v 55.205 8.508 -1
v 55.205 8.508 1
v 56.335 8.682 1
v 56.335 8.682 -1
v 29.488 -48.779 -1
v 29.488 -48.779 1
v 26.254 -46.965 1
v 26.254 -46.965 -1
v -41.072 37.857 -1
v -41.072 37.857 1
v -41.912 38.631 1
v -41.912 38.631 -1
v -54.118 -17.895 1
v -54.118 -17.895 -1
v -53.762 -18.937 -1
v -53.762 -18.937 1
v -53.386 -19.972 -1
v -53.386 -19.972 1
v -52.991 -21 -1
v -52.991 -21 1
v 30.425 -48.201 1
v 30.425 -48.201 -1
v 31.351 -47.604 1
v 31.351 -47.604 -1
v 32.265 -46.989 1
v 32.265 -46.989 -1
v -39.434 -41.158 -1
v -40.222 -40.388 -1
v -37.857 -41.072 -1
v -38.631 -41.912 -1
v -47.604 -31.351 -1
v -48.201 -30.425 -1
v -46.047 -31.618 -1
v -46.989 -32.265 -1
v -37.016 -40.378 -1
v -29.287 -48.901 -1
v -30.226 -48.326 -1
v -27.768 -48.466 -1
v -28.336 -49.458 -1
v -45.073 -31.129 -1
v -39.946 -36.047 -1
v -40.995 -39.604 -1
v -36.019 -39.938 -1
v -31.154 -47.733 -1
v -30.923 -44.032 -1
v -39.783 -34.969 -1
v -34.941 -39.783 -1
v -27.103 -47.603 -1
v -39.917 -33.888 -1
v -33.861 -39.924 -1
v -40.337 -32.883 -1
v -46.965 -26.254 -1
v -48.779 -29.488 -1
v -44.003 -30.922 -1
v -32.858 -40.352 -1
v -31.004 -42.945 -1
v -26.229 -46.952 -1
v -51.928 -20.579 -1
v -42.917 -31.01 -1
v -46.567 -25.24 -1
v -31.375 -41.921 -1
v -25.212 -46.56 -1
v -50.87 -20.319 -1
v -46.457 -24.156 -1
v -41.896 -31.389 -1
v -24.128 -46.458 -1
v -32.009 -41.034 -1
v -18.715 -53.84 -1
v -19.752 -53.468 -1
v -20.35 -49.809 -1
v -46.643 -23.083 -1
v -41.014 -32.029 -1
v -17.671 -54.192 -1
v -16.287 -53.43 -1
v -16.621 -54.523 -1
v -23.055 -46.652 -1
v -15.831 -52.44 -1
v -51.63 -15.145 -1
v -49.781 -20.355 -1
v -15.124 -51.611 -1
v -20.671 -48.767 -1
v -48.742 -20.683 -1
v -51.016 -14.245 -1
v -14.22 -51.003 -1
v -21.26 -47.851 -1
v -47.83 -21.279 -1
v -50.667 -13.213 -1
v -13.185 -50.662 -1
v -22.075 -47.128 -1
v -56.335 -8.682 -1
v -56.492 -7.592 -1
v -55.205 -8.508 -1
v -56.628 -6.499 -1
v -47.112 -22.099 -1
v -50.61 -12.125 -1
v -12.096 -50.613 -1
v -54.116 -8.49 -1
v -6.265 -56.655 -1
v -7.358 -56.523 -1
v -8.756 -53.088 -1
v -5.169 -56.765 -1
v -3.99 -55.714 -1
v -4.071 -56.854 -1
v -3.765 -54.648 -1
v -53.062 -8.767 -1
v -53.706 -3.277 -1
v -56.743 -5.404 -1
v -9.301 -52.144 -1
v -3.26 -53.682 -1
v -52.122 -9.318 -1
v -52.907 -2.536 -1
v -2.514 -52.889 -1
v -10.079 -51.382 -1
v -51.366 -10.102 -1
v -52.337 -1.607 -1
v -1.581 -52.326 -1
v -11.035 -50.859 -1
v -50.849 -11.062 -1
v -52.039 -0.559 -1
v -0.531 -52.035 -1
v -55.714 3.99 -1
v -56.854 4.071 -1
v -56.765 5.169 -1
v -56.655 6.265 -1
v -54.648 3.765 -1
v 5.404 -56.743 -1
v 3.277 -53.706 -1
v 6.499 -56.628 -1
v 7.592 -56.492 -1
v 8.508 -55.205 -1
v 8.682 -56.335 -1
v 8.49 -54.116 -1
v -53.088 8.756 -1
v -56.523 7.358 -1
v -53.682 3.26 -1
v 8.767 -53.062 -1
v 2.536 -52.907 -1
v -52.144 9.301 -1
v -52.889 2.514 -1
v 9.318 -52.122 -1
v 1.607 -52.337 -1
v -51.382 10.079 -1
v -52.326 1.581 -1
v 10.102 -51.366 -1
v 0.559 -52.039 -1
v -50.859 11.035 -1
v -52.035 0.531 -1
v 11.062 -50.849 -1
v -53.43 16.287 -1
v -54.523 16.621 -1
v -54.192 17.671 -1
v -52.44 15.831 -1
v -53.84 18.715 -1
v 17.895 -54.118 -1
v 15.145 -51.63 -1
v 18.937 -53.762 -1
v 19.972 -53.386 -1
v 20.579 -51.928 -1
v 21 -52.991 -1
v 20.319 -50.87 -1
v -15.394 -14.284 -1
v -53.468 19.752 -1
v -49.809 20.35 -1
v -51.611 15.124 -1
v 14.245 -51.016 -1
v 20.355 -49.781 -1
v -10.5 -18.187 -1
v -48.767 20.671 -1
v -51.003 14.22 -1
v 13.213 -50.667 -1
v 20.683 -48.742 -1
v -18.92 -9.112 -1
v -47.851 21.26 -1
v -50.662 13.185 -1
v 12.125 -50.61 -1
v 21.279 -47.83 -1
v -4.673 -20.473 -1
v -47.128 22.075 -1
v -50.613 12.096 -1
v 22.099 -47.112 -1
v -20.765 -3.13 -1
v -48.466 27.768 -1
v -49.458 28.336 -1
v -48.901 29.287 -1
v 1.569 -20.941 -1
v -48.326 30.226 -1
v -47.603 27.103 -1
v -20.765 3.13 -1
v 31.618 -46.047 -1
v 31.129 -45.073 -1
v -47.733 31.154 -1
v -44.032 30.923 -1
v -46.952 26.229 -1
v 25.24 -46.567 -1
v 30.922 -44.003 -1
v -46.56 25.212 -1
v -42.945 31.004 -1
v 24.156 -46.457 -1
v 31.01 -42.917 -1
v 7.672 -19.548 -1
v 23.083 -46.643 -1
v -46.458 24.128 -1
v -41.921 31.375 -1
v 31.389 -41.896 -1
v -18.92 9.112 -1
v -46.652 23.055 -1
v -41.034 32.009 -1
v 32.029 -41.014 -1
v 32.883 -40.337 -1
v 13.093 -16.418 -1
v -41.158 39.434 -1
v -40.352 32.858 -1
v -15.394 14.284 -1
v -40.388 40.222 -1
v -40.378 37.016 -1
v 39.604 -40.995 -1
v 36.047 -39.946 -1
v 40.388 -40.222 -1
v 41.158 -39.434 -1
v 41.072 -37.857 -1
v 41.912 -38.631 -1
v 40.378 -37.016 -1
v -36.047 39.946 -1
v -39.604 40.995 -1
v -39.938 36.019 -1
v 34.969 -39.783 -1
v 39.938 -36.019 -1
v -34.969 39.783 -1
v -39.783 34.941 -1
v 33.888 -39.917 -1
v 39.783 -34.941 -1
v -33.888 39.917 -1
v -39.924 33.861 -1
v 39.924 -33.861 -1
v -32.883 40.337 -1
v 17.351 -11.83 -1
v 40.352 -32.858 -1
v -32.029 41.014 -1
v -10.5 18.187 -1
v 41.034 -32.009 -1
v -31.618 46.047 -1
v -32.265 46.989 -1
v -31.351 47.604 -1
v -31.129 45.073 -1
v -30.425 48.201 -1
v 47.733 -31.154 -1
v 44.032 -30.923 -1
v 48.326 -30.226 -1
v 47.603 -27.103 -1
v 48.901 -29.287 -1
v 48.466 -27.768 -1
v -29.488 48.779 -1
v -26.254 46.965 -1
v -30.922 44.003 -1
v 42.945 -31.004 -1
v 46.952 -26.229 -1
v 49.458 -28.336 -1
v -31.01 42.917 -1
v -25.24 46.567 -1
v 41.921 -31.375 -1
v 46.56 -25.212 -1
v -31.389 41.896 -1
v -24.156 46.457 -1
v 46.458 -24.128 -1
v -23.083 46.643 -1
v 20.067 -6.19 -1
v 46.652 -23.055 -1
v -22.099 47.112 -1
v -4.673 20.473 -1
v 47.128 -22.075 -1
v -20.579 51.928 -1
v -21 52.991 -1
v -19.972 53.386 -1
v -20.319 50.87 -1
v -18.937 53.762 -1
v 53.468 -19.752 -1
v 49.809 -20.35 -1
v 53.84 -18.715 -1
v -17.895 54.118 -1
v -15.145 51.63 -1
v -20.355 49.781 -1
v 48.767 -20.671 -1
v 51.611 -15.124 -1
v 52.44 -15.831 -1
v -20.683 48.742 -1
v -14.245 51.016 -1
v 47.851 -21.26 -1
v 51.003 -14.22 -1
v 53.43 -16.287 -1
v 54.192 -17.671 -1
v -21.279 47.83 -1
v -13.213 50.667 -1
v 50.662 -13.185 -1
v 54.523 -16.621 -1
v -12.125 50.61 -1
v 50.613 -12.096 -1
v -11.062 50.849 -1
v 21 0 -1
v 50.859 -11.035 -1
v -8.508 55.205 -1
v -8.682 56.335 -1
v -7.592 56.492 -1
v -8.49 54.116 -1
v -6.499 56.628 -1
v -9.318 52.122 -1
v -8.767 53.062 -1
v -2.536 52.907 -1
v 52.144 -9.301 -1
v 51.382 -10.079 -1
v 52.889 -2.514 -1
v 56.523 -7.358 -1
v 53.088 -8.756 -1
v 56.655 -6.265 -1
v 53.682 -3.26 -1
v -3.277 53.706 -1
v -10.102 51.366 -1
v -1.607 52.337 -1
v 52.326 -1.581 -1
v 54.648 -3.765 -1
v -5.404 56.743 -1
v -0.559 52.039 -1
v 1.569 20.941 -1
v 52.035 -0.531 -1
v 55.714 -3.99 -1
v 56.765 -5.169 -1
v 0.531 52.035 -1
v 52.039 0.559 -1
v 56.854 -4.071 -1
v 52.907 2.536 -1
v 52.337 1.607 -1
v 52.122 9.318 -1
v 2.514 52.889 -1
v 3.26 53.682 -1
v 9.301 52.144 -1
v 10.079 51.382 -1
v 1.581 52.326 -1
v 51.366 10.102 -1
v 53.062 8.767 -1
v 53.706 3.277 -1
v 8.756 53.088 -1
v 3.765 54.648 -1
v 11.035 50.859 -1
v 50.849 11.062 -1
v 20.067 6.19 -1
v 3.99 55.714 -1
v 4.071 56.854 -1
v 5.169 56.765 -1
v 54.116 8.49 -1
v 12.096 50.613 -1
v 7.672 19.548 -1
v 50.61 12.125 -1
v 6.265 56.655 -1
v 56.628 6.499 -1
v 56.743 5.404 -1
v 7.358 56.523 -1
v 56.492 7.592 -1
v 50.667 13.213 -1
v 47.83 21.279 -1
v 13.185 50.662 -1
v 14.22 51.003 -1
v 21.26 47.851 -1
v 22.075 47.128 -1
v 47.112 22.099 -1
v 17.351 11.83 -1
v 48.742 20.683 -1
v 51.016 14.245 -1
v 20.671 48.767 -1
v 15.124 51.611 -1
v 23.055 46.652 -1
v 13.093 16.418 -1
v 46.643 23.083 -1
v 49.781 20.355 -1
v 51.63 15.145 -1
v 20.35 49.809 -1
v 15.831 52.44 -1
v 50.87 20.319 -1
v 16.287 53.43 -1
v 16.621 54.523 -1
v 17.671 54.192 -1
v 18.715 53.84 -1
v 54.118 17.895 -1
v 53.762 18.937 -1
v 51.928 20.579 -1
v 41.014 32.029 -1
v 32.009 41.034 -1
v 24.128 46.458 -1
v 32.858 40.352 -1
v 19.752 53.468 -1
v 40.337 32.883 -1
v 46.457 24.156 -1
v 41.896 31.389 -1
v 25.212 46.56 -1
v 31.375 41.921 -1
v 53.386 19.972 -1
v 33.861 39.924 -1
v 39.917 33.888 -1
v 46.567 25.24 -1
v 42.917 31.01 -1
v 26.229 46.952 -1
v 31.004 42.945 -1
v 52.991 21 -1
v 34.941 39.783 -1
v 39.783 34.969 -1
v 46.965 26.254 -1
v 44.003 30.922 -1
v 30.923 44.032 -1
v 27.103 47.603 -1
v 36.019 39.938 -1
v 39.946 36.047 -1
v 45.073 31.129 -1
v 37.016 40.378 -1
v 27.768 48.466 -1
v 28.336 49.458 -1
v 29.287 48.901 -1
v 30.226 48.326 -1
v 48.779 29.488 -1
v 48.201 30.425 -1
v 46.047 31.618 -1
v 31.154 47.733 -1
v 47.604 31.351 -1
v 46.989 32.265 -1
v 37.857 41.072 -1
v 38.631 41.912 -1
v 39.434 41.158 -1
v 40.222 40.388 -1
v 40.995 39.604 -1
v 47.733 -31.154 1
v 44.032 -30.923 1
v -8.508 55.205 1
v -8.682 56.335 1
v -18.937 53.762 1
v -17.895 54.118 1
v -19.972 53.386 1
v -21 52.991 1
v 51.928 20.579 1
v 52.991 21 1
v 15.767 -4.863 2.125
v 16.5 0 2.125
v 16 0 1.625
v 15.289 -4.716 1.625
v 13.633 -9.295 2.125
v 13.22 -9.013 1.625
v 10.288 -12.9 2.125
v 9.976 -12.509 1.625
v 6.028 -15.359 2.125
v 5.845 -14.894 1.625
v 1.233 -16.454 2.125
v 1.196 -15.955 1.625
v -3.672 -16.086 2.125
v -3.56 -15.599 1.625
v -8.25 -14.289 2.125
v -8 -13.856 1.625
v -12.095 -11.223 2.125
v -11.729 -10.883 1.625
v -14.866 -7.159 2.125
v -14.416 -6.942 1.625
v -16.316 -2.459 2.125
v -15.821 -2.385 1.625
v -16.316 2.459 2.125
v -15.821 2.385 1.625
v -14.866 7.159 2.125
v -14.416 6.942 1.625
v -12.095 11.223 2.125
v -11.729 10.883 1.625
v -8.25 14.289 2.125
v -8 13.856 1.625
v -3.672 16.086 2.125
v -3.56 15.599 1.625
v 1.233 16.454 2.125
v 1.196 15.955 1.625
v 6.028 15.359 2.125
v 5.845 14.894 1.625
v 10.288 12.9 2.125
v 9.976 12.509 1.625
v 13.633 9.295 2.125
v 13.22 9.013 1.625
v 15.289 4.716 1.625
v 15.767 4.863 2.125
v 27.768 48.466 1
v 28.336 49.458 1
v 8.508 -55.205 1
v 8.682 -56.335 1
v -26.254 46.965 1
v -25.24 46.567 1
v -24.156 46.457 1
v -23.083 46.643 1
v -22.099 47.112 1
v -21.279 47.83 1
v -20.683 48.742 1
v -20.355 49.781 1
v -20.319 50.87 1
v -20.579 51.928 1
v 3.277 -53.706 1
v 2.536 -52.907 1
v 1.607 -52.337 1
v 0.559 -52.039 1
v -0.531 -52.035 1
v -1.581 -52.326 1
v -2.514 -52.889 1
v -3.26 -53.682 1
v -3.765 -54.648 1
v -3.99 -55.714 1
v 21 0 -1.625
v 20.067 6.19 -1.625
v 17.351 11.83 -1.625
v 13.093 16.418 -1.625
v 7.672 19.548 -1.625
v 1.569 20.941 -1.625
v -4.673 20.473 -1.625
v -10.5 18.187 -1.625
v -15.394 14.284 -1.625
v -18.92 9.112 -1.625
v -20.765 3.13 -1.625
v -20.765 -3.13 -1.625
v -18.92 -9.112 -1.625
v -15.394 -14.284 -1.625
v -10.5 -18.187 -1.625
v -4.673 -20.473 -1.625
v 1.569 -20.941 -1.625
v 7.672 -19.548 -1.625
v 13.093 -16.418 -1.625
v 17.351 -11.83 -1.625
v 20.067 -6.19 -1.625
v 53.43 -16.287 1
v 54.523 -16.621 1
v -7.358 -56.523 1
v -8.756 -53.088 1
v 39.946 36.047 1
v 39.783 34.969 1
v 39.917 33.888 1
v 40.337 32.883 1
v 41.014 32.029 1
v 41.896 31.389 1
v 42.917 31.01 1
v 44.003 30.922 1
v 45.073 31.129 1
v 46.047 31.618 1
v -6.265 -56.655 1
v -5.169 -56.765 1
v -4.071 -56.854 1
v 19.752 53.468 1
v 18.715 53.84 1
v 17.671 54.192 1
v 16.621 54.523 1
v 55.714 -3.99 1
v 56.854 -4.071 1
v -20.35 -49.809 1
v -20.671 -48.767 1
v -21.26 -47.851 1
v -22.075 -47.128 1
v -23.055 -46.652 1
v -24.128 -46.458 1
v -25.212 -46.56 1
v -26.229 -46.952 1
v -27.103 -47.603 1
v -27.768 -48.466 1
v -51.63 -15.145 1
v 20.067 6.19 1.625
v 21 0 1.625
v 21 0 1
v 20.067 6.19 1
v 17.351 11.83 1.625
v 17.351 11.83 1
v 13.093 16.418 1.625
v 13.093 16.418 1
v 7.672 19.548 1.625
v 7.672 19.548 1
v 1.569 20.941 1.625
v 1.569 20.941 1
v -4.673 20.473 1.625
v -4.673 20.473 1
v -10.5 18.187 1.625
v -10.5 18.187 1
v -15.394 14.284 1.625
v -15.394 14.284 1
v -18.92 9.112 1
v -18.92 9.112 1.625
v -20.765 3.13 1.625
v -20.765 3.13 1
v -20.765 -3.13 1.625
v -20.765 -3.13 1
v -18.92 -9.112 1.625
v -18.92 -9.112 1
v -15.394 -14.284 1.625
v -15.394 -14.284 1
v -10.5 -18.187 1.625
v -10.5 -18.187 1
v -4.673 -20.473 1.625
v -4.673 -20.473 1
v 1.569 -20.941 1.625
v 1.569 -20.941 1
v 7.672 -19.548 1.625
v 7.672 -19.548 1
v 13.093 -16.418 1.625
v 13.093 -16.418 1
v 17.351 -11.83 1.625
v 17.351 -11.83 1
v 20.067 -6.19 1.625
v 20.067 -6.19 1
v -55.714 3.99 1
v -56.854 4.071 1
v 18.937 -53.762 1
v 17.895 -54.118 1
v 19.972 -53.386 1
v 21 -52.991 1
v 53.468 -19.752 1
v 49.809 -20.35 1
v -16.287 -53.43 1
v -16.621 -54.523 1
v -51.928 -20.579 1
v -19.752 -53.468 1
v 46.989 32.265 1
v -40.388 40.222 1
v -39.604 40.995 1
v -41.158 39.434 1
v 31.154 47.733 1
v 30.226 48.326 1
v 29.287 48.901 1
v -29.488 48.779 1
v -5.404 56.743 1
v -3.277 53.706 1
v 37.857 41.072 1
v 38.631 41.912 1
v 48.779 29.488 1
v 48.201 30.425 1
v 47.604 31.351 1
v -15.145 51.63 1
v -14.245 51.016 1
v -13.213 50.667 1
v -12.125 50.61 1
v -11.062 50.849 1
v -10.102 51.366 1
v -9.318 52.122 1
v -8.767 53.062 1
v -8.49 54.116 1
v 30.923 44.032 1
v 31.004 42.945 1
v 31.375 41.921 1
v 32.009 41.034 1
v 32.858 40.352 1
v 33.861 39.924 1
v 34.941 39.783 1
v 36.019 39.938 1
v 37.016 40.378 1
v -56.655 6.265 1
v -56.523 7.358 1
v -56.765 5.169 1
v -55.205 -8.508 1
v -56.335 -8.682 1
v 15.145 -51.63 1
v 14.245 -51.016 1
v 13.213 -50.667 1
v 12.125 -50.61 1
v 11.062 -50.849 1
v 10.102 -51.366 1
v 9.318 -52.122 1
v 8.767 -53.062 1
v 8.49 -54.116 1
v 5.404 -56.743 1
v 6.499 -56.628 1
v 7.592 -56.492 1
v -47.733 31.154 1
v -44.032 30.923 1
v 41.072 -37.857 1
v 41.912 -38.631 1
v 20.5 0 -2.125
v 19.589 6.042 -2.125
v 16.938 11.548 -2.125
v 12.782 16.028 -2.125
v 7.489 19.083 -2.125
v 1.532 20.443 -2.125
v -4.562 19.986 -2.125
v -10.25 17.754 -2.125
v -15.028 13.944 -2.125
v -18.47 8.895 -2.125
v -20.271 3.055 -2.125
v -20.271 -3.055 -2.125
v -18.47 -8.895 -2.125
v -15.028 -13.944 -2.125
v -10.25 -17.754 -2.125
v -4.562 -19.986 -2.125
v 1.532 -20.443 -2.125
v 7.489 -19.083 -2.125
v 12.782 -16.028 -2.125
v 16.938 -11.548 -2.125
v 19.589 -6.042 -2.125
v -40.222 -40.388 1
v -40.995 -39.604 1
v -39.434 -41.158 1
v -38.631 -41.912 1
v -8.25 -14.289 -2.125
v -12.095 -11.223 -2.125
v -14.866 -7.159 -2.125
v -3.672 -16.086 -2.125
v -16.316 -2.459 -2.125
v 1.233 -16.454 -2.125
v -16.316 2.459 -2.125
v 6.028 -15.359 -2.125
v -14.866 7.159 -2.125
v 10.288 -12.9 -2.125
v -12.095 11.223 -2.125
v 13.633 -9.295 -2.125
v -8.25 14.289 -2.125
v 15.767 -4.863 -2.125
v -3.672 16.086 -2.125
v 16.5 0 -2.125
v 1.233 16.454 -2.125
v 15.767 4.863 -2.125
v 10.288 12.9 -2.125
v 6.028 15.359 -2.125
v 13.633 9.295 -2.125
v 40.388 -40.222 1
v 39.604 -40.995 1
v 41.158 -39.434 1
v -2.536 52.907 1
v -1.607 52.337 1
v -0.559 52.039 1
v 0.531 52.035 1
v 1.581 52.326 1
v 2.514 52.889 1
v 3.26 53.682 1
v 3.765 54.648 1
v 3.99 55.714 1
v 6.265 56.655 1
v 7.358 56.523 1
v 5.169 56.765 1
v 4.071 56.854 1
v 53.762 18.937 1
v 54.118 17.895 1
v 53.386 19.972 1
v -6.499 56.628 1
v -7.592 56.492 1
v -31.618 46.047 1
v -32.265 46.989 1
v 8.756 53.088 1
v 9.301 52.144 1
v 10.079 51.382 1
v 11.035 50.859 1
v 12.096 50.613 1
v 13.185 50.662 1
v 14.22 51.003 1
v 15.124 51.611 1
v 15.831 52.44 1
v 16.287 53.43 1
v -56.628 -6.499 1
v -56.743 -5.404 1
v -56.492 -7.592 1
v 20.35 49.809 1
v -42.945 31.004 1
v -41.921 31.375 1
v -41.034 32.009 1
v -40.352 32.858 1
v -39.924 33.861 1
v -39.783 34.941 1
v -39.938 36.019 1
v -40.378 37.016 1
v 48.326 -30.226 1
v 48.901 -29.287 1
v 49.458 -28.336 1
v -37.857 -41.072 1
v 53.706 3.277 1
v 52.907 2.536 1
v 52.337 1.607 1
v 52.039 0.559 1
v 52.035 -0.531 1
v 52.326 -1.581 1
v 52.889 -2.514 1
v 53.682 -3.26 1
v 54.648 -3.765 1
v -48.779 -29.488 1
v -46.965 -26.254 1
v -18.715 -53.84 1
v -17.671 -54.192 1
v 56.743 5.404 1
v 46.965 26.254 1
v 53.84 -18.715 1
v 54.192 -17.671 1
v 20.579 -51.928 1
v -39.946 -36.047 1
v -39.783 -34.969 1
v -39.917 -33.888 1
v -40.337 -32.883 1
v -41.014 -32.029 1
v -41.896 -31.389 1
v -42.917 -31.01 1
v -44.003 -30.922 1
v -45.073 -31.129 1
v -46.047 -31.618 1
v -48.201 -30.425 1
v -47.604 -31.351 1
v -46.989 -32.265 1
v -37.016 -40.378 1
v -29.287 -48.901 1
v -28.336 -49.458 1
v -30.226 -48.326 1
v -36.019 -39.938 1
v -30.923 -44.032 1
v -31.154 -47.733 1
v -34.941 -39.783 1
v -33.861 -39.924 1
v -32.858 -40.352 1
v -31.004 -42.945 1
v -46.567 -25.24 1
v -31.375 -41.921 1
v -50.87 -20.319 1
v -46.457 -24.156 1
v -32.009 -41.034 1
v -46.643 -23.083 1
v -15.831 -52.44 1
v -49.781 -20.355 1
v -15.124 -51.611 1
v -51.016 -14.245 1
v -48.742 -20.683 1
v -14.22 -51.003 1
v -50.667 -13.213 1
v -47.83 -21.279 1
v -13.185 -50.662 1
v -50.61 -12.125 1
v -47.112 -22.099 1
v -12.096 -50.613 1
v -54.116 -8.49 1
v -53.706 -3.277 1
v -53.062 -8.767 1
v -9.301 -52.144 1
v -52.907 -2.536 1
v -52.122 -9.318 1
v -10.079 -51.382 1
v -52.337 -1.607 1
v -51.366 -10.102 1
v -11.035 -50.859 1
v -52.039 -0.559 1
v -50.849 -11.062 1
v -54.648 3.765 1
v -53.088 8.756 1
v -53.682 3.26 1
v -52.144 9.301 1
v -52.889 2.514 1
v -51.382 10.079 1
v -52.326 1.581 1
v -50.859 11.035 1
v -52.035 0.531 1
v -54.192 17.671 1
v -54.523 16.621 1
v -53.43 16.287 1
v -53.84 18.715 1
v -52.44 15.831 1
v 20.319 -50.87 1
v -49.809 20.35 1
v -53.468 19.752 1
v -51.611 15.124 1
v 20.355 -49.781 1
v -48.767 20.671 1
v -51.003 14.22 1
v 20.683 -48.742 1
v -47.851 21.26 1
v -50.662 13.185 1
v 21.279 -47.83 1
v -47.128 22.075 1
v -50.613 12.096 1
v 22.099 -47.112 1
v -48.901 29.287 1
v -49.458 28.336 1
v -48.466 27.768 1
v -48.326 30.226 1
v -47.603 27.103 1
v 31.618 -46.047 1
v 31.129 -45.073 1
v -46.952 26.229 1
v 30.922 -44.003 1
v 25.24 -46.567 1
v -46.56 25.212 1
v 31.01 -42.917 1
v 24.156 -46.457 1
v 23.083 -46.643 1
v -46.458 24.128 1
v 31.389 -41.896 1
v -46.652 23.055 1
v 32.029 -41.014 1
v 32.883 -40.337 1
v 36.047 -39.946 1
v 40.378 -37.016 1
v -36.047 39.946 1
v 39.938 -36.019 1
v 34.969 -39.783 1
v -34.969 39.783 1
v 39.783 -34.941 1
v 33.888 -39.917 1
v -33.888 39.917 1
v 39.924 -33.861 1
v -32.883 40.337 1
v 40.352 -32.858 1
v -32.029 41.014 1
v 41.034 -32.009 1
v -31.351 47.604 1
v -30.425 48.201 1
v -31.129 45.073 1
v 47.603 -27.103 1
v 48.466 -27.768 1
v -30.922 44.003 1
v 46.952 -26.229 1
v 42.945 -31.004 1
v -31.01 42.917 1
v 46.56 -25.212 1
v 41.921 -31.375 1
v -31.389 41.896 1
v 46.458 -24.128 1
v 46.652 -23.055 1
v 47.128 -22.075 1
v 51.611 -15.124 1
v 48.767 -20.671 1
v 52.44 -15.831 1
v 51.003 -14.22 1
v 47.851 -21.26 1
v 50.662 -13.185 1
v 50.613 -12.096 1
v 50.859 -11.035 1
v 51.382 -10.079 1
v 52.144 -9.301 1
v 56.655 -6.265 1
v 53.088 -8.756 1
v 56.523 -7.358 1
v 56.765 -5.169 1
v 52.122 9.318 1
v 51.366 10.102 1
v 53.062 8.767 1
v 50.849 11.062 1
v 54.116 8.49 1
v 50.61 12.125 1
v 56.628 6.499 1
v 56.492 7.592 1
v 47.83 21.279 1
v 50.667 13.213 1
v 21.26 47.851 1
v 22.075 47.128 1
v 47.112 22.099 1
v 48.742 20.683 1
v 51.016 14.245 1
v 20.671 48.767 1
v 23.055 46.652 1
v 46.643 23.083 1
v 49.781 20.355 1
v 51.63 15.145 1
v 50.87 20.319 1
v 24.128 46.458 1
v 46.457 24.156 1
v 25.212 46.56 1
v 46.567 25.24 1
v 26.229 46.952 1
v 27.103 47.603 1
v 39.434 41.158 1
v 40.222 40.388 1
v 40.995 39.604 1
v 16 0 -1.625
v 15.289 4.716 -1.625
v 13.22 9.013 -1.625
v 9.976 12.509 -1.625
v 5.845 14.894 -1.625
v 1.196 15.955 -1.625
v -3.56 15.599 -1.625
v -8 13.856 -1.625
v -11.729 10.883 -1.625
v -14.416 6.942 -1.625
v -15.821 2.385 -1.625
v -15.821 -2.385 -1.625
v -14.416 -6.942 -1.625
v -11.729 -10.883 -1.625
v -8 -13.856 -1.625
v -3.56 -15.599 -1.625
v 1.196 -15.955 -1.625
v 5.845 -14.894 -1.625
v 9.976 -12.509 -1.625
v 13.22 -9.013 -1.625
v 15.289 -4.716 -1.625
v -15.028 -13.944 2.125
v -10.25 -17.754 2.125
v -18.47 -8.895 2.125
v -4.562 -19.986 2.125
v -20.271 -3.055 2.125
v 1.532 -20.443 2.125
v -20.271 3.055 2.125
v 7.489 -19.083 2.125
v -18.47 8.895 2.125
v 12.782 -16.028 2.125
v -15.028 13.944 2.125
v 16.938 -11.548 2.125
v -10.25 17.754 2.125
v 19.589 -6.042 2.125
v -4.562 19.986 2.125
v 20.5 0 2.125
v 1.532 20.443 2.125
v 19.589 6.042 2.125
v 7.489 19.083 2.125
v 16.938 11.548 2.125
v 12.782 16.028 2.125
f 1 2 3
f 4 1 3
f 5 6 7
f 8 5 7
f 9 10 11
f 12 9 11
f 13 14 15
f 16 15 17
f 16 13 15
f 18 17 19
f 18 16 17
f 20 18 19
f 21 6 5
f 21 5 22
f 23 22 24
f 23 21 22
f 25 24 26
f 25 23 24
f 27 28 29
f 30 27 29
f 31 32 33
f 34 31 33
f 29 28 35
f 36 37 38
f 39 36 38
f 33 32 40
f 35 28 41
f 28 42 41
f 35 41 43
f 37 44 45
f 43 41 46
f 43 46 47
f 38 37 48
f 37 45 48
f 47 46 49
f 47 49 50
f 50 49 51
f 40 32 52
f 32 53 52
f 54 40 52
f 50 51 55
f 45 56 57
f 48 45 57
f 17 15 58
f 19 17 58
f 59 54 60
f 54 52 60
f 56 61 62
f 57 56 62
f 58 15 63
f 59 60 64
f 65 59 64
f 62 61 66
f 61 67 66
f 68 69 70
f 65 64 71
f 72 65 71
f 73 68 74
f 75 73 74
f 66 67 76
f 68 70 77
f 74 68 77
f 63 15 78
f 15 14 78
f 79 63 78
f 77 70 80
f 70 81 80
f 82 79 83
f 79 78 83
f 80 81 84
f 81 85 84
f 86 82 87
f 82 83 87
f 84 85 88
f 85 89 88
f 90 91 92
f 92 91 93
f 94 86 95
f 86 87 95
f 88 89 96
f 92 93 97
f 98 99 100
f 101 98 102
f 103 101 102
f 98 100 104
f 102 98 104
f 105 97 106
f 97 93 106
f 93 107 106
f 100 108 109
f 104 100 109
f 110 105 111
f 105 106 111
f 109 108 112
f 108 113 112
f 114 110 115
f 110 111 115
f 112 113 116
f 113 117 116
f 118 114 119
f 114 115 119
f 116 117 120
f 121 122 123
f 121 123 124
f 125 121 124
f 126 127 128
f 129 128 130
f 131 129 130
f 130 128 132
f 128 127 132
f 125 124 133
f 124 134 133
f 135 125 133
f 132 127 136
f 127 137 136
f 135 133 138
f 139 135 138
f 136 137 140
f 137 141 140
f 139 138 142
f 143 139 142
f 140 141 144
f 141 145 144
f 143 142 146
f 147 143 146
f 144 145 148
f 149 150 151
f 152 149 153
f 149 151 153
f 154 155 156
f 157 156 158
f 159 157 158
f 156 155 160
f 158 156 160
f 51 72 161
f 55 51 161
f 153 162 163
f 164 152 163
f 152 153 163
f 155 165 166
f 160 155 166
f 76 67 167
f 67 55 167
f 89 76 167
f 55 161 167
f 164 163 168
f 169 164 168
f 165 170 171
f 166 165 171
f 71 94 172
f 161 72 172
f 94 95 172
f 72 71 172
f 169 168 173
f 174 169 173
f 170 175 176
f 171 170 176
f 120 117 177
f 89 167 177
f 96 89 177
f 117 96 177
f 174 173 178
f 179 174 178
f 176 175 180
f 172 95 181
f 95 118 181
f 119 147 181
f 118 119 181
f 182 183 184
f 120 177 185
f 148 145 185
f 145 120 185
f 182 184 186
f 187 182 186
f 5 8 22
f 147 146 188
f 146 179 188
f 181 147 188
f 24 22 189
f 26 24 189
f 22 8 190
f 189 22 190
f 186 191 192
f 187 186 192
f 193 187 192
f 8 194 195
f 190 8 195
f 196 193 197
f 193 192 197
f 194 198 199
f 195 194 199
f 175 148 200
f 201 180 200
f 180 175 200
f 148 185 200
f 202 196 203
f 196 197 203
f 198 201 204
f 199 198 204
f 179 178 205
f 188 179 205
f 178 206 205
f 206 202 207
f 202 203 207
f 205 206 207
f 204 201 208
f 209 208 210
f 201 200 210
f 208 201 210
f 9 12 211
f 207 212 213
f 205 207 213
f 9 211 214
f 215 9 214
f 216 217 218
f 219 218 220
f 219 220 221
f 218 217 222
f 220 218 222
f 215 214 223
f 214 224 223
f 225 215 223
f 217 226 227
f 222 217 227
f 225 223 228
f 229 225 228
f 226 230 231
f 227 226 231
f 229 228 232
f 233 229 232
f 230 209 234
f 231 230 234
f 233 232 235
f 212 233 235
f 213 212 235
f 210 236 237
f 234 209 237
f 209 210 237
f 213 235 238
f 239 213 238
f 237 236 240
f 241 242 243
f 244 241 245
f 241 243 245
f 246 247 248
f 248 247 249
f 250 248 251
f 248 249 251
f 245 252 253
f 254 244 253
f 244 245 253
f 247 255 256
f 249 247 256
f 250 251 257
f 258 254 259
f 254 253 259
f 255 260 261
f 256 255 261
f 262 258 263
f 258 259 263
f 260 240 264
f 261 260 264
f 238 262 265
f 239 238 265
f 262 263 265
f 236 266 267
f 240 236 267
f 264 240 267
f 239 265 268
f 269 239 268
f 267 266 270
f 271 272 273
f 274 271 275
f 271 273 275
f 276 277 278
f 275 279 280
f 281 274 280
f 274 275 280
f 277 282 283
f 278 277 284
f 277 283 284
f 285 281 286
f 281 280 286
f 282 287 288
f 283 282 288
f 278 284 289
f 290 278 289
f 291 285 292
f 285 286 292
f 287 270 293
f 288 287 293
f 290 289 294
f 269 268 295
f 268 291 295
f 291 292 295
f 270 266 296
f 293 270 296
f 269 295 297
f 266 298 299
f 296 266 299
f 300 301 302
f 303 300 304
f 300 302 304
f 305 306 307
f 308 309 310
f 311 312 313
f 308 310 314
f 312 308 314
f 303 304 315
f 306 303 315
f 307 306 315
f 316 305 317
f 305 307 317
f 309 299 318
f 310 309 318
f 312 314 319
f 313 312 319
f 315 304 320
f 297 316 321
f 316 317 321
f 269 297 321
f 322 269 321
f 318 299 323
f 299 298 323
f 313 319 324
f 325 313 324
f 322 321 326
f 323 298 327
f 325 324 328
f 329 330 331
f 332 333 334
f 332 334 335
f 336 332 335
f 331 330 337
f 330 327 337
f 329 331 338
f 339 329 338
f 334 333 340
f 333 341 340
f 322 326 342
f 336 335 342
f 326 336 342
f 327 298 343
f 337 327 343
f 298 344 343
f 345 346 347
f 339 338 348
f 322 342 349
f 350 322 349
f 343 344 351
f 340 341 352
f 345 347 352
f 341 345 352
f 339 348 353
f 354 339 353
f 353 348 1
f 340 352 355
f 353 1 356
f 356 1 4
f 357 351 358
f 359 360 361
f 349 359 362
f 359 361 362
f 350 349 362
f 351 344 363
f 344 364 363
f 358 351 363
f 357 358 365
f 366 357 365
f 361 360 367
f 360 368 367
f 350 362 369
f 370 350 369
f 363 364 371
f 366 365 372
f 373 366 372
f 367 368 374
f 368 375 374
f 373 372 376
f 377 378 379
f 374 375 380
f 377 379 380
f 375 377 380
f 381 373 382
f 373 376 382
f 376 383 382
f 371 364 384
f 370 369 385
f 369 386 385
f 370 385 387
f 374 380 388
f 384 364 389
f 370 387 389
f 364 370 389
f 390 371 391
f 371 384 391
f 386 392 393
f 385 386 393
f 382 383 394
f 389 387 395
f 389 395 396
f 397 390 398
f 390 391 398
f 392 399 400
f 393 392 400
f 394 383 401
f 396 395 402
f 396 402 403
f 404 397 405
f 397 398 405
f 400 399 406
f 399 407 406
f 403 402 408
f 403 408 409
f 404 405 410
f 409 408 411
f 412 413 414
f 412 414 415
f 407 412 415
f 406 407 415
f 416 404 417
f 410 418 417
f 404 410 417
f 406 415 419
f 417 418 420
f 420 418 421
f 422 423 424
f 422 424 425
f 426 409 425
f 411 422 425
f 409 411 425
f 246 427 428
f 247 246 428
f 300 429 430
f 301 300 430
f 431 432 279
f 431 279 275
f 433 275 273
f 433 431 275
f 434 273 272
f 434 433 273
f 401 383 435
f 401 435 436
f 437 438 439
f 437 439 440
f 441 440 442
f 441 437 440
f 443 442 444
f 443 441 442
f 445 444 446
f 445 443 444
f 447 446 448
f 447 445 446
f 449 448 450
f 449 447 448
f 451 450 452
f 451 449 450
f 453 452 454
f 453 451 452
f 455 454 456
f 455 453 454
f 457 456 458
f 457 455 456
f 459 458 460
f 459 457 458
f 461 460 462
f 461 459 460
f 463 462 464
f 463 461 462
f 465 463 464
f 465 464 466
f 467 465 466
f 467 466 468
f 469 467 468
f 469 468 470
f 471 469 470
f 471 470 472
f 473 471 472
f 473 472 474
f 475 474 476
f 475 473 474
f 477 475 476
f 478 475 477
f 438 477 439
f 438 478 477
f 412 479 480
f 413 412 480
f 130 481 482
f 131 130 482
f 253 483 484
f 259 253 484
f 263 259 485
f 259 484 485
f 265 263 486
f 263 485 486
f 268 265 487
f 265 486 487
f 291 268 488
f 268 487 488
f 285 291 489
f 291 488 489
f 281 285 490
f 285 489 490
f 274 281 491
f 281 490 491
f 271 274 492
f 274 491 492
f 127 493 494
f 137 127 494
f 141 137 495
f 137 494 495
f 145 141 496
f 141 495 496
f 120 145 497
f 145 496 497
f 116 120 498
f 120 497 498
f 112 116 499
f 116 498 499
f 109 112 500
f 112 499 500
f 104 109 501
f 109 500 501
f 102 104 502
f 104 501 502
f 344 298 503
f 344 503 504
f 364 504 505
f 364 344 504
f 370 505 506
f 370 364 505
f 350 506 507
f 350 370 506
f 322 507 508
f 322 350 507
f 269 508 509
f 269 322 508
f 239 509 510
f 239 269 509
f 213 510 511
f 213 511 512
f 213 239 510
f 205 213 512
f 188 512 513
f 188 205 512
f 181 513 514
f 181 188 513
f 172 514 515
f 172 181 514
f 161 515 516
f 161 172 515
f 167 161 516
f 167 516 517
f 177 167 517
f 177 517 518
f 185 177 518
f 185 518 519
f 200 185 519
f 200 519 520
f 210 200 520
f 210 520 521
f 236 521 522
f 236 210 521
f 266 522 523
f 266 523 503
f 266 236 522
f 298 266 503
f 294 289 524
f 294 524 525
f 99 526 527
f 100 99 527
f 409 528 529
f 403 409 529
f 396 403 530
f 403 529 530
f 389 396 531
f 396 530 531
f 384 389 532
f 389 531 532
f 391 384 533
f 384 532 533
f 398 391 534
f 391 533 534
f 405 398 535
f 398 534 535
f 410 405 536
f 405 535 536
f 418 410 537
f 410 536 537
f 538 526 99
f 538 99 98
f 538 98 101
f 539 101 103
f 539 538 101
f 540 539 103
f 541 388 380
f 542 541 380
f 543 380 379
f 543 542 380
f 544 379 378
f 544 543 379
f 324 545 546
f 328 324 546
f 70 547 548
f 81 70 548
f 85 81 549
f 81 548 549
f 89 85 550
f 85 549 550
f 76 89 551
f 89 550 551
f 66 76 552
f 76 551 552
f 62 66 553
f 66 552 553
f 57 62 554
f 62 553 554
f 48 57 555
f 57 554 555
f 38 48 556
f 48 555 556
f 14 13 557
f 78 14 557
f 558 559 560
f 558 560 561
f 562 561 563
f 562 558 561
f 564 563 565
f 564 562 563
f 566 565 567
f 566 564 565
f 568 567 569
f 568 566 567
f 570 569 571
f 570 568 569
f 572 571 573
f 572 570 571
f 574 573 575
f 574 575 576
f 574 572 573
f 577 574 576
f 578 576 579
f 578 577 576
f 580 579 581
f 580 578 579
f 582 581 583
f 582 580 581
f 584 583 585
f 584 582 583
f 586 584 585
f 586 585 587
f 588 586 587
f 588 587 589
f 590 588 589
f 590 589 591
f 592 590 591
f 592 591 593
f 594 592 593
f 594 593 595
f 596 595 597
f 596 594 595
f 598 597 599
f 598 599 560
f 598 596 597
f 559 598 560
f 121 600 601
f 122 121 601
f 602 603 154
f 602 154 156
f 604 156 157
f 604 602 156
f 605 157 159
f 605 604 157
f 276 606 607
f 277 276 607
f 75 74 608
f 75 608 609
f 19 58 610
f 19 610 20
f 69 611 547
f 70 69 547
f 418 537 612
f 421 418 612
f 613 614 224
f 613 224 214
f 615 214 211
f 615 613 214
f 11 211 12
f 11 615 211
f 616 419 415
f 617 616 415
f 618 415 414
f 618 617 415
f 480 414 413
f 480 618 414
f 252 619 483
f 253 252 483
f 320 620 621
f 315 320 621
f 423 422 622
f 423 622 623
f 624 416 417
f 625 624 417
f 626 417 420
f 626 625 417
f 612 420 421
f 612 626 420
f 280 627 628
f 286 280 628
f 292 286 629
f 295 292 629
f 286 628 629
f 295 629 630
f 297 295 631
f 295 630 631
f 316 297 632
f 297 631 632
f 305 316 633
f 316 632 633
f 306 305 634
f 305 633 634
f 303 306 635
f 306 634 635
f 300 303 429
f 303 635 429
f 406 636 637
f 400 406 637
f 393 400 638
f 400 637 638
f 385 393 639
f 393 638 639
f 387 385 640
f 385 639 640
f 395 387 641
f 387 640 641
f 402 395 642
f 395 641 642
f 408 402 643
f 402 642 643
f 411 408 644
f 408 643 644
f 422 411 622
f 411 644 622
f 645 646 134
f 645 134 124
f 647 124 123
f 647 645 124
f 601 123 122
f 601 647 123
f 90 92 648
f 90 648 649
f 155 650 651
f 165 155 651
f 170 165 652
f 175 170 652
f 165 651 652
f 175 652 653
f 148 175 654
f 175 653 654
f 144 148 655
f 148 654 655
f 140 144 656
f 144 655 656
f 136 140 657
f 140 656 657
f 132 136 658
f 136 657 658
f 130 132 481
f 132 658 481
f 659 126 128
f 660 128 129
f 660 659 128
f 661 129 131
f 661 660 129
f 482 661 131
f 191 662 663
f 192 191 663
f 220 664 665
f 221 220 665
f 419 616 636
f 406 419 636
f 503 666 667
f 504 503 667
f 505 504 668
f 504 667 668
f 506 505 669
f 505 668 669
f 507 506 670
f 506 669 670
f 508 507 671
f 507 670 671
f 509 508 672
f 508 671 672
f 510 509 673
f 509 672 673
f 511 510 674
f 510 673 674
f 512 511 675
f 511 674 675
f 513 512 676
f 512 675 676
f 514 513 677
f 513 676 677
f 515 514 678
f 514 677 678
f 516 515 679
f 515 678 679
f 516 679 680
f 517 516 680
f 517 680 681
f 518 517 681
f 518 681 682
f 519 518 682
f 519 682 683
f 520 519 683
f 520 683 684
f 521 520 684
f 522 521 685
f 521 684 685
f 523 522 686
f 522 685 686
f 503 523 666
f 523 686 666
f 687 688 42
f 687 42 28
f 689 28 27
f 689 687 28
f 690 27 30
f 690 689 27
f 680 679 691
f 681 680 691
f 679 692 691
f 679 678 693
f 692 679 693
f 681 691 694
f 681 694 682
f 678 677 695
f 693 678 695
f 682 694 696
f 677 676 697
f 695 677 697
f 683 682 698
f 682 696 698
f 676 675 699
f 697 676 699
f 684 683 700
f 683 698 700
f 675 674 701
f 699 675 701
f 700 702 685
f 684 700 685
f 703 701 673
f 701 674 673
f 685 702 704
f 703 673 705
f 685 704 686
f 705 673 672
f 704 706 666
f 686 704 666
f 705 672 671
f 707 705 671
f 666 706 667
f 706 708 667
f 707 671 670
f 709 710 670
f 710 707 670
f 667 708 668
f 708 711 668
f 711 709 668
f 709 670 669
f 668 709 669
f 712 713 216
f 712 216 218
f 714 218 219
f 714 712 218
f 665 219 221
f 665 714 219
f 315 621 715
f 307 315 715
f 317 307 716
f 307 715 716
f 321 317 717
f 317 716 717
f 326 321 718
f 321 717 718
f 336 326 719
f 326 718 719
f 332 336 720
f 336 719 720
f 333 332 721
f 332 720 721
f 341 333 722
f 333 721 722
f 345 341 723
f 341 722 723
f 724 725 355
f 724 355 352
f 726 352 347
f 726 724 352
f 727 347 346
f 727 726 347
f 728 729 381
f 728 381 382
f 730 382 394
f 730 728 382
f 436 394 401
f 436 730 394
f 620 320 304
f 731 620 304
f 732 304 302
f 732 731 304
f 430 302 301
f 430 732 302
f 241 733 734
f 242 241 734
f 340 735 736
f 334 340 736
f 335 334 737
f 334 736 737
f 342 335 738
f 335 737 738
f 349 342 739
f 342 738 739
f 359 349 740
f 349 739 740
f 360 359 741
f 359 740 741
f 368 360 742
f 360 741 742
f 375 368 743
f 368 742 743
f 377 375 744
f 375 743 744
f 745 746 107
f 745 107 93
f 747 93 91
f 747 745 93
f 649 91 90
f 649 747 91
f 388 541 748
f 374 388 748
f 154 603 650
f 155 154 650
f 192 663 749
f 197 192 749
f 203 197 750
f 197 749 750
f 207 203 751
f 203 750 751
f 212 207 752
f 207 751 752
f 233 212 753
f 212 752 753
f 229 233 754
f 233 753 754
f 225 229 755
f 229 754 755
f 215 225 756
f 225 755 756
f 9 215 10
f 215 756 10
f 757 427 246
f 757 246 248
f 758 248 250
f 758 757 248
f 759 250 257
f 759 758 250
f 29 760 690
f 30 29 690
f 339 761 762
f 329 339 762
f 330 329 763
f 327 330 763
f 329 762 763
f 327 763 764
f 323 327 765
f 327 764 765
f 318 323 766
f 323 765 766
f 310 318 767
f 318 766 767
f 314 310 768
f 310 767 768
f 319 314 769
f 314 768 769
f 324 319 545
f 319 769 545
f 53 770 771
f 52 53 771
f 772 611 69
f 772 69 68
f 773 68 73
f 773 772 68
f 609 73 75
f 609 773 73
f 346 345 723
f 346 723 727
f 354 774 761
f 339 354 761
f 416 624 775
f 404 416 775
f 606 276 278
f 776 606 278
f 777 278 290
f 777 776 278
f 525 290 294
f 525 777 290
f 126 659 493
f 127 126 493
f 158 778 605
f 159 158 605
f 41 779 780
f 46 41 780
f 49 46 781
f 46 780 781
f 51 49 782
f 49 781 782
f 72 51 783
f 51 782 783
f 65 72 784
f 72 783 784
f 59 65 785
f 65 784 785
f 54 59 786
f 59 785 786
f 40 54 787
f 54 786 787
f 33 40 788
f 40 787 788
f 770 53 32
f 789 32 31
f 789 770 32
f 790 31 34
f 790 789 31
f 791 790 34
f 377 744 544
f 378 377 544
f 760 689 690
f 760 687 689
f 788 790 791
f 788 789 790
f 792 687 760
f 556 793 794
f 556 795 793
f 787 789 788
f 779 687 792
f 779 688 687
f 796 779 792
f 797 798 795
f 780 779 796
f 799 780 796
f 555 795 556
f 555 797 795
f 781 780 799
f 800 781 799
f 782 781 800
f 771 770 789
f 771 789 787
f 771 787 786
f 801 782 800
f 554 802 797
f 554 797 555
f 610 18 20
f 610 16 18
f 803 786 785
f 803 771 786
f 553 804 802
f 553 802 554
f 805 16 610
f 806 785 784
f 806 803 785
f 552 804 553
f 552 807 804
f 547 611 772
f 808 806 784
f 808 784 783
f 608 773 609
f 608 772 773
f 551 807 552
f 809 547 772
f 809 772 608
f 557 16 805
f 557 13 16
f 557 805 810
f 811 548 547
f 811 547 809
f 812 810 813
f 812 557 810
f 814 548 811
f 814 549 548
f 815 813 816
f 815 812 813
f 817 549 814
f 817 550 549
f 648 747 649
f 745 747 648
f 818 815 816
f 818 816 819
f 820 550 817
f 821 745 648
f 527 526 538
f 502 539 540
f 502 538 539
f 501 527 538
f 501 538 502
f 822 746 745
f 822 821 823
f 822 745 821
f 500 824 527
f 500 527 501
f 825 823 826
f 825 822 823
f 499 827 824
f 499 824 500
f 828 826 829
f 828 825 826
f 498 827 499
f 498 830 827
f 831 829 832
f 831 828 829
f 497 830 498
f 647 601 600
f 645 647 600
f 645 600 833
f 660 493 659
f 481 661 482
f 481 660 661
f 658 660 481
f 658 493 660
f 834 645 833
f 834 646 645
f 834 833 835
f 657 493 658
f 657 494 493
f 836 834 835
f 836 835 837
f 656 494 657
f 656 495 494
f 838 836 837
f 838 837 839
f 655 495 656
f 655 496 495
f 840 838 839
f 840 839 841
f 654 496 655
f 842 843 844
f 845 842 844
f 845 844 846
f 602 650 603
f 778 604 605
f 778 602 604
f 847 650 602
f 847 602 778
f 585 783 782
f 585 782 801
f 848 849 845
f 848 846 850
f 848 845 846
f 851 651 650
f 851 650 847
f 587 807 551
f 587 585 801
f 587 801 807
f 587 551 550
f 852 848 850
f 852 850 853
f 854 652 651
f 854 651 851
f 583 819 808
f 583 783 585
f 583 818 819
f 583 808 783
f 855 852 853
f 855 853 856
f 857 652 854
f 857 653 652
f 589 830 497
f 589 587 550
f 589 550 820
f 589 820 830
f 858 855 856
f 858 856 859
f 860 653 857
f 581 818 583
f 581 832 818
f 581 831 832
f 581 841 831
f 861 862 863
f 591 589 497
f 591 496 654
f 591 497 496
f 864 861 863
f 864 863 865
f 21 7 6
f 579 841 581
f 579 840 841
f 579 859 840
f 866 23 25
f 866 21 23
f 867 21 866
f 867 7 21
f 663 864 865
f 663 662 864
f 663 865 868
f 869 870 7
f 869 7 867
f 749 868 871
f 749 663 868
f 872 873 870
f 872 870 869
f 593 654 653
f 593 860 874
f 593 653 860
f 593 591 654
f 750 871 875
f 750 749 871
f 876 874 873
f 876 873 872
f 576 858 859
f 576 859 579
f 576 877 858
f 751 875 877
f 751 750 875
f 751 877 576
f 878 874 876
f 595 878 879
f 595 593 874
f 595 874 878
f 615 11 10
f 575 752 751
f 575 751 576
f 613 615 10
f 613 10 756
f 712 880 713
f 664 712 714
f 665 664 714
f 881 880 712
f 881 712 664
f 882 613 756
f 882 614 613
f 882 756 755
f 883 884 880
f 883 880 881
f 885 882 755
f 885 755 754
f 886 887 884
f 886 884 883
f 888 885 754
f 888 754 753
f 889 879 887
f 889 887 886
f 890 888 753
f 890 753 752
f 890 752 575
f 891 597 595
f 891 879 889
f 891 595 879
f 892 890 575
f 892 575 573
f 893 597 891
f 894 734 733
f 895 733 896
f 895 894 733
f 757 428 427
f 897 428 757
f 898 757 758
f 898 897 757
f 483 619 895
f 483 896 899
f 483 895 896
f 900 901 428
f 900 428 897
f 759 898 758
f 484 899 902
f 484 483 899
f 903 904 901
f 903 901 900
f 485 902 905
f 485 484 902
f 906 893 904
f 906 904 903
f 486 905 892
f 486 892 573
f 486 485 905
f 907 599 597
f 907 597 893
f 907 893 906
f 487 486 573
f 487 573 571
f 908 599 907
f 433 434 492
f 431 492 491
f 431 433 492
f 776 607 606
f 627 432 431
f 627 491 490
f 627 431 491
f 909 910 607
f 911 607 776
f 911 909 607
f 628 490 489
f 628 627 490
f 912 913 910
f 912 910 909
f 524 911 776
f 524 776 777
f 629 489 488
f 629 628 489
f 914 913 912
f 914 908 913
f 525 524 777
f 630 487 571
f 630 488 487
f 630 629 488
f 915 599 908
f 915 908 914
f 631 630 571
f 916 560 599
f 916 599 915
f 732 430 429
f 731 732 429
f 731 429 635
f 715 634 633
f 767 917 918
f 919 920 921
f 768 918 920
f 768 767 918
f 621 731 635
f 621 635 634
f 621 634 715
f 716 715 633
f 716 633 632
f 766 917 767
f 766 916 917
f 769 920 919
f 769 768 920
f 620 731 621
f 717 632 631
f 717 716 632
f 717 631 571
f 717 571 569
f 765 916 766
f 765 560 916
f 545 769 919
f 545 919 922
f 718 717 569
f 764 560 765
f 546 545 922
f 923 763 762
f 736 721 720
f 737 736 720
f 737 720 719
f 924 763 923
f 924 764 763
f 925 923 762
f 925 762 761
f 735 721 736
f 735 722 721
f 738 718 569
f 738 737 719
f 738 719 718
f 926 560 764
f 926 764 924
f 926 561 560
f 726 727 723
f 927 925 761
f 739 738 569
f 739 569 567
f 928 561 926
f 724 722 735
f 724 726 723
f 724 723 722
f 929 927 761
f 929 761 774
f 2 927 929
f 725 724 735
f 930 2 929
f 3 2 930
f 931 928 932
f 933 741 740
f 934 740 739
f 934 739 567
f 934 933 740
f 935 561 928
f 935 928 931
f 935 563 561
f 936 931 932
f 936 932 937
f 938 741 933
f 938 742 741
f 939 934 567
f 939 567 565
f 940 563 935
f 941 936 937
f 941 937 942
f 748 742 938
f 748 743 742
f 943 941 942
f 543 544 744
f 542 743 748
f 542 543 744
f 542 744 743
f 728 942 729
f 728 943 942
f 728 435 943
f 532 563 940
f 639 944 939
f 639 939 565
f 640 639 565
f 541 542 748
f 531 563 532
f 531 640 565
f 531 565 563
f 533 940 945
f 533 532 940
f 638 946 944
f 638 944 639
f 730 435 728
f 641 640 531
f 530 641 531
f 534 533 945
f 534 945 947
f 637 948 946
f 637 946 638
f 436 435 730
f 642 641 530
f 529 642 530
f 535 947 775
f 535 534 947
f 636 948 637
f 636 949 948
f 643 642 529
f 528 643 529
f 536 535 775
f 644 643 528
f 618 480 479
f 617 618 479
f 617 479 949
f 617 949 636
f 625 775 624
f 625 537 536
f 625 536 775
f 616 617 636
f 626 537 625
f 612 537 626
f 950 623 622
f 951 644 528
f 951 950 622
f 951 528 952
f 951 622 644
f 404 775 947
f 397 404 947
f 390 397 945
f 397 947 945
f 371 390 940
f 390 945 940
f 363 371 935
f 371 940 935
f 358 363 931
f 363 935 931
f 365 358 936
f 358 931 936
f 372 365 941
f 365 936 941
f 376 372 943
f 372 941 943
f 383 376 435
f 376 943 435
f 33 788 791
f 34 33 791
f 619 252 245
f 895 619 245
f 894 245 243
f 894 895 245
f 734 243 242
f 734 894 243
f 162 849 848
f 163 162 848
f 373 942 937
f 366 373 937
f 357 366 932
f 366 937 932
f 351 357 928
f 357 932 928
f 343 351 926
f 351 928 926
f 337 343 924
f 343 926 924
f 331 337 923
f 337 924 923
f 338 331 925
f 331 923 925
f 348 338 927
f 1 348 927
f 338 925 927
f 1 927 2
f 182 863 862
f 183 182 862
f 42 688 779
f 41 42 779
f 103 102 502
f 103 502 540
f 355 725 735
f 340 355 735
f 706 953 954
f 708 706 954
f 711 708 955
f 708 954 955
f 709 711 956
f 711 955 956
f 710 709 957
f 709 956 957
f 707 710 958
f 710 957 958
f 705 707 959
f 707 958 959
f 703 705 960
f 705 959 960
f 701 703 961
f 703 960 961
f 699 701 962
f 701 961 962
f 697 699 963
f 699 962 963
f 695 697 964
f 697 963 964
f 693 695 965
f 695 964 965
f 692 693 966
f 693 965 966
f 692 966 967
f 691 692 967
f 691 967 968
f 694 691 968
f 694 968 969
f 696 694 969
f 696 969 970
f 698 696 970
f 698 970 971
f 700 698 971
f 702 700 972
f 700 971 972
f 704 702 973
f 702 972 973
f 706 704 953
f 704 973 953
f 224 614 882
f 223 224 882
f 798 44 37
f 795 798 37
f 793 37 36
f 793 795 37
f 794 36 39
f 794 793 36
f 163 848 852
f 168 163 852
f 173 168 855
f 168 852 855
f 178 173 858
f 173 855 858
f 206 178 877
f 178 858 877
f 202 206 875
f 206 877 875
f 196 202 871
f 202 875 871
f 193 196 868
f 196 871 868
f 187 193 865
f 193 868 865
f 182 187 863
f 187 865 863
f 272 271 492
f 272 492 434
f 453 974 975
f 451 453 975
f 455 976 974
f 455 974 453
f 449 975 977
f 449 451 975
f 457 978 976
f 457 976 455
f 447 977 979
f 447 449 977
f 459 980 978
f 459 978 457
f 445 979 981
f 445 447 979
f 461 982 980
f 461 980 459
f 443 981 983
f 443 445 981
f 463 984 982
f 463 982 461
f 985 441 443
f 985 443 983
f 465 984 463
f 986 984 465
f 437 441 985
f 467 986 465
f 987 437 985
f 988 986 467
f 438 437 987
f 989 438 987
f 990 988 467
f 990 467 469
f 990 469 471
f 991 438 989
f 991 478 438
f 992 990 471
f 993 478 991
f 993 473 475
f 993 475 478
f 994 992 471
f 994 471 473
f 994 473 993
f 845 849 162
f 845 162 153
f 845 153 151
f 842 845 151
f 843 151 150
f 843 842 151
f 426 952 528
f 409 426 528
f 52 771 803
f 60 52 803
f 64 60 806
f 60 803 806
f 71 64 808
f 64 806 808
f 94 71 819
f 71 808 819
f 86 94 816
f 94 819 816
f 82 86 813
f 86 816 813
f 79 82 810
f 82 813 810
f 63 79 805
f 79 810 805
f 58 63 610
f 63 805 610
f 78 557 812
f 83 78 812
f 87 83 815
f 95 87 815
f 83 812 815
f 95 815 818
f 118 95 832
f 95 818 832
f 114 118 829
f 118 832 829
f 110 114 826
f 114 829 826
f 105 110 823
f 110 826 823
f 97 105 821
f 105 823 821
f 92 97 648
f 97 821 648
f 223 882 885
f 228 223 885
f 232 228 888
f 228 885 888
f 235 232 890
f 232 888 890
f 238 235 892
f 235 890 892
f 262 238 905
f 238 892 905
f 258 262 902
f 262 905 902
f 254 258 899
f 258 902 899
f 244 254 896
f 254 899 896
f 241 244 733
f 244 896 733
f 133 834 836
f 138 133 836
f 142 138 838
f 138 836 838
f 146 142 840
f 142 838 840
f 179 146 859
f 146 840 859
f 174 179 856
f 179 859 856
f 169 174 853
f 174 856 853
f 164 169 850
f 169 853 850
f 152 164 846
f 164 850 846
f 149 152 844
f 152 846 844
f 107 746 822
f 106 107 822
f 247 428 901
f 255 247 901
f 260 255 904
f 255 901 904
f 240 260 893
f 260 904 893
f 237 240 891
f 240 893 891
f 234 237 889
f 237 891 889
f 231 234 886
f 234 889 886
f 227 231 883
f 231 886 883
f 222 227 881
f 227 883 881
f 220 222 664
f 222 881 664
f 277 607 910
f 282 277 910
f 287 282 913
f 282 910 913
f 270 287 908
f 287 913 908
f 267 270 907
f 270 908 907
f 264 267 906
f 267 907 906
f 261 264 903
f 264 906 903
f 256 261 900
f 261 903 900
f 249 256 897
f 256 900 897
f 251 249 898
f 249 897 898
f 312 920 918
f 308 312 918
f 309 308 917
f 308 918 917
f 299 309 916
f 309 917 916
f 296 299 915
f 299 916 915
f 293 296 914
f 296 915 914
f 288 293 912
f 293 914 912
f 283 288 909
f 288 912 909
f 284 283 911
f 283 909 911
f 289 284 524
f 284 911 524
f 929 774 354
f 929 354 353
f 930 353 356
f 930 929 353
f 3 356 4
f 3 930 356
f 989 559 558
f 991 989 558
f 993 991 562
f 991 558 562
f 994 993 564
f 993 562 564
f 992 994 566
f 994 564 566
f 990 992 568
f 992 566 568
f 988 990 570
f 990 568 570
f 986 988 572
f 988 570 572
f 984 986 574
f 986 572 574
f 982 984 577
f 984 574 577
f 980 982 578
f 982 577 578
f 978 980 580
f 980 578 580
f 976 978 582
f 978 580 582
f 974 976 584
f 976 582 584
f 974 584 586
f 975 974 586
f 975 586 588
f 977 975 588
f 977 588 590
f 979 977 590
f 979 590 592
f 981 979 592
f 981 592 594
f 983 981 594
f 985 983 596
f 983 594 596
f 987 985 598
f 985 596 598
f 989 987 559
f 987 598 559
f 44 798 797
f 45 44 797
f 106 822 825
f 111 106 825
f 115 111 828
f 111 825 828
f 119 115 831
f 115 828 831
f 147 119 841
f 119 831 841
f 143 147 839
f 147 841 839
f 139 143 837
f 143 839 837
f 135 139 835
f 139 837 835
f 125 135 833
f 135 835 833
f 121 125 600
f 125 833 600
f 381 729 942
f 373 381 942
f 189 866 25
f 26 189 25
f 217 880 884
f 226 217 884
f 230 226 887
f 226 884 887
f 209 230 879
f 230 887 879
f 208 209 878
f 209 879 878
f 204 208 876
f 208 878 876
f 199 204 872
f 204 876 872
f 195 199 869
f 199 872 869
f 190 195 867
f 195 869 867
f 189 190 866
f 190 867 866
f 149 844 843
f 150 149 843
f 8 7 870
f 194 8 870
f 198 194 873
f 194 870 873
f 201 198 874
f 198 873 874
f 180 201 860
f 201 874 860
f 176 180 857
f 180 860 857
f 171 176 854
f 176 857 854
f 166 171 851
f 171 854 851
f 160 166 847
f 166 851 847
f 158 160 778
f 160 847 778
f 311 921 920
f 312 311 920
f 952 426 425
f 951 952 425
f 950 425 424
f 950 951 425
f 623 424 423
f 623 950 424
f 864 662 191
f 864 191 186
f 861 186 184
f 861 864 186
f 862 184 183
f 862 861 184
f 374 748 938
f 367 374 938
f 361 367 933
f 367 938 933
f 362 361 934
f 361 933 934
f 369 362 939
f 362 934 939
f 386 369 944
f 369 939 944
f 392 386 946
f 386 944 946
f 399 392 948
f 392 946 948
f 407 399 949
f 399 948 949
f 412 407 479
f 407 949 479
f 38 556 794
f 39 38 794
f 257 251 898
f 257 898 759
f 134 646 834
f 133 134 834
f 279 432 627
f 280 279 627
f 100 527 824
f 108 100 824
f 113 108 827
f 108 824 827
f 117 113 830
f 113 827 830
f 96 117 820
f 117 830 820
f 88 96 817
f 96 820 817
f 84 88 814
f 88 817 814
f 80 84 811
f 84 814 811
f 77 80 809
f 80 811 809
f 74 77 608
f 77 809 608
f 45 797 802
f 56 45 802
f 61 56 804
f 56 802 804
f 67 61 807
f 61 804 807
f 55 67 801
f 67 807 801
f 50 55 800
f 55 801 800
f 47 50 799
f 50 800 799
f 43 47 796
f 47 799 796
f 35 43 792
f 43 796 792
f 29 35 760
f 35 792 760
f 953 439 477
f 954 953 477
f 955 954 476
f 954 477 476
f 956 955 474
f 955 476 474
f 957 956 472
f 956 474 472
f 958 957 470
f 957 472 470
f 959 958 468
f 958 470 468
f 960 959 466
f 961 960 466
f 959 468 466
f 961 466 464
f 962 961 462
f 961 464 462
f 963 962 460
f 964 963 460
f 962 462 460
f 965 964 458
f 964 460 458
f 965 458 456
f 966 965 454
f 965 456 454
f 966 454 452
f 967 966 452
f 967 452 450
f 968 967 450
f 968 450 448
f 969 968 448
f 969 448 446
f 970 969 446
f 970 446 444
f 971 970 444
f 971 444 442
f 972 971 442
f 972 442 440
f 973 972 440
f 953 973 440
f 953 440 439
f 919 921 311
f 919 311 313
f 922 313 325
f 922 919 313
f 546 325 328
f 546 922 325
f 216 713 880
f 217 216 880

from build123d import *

# Parameters (mm, degrees)
ESQUISSE1_R                  = 57
EXTRUSION1_DEPTH             = 1
ENL_V_MAT_EXTRU_1_DEPTH      = 2
R_P_TITION_CIRCULAIRE1_COUNT = 28
ESQUISSE3_R                  = 21
EXTRUSION2_DEPTH             = 2.125
ESQUISSE4_R                  = 16
ENL_V_MAT_EXTRU_2_DEPTH      = 3.125
ENL_V_MAT_EXTRU_2_DEPTH_BACK = 3.125
CHANFREIN1_SIZE              = 0.5


with BuildPart() as part:
    # Esquisse1 → Extrusion1 (new body, symmetric)
    with BuildSketch(Plane.XY):
        Circle(ESQUISSE1_R)
    extrude(amount=EXTRUSION1_DEPTH, both=True)

    # Esquisse2 → Enlèv. mat.-Extru.1 (cut, symmetric)
    with BuildSketch(Plane.XY):
        with BuildLine():
            Line((-5.403559241, 56.743295177), (-3.276608177, 53.705694255))
            ThreePointArc((-3.276608177, 53.705694255), (1.065722501, 52.144583609), (3.98978287, 55.714285714))
            Line((3.98978287, 55.714285714), (4.071428571, 56.854405892))
            ThreePointArc((4.071428571, 56.854405892), (-0.668378207, 56.996081186), (-5.403559241, 56.743295177))
        make_face()
    enl_v_mat_extru_1 = extrude(amount=ENL_V_MAT_EXTRU_1_DEPTH, both=True, mode=Mode.SUBTRACT)

    # Répétition circulaire1: Enlèv. mat.-Extru.1 ×28 about axis
    r_p_tition_circulaire1_axis = Axis((0, 0, 0), (0, 0, 1))
    for i in range(1, R_P_TITION_CIRCULAIRE1_COUNT):
        add(enl_v_mat_extru_1.rotate(r_p_tition_circulaire1_axis, i * 360 / R_P_TITION_CIRCULAIRE1_COUNT), mode=Mode.SUBTRACT)

    # Esquisse3 → Extrusion2 (add, symmetric)
    with BuildSketch(Plane.XY):
        Circle(ESQUISSE3_R)
    extrude(amount=EXTRUSION2_DEPTH, both=True)

    # Esquisse4 → Enlèv. mat.-Extru.2 (cut, two sides)
    with BuildSketch(Plane.XY) as enl_v_mat_extru_2_sk:
        Circle(ESQUISSE4_R)
    extrude(amount=ENL_V_MAT_EXTRU_2_DEPTH, mode=Mode.SUBTRACT)
    extrude(enl_v_mat_extru_2_sk.sketch, amount=-ENL_V_MAT_EXTRU_2_DEPTH_BACK, mode=Mode.SUBTRACT)

    # Chanfrein1
    chanfrein1_edges = [part.edges().sort_by_distance(p)[0] for p in [
        (-21, 0, -2.125),
        (-21, 0, 2.125),
        (-16, 0, -2.125),
        (-16, 0, 2.125),
    ]]
    chamfer(chanfrein1_edges, length=CHANFREIN1_SIZE)


solid = part.part
